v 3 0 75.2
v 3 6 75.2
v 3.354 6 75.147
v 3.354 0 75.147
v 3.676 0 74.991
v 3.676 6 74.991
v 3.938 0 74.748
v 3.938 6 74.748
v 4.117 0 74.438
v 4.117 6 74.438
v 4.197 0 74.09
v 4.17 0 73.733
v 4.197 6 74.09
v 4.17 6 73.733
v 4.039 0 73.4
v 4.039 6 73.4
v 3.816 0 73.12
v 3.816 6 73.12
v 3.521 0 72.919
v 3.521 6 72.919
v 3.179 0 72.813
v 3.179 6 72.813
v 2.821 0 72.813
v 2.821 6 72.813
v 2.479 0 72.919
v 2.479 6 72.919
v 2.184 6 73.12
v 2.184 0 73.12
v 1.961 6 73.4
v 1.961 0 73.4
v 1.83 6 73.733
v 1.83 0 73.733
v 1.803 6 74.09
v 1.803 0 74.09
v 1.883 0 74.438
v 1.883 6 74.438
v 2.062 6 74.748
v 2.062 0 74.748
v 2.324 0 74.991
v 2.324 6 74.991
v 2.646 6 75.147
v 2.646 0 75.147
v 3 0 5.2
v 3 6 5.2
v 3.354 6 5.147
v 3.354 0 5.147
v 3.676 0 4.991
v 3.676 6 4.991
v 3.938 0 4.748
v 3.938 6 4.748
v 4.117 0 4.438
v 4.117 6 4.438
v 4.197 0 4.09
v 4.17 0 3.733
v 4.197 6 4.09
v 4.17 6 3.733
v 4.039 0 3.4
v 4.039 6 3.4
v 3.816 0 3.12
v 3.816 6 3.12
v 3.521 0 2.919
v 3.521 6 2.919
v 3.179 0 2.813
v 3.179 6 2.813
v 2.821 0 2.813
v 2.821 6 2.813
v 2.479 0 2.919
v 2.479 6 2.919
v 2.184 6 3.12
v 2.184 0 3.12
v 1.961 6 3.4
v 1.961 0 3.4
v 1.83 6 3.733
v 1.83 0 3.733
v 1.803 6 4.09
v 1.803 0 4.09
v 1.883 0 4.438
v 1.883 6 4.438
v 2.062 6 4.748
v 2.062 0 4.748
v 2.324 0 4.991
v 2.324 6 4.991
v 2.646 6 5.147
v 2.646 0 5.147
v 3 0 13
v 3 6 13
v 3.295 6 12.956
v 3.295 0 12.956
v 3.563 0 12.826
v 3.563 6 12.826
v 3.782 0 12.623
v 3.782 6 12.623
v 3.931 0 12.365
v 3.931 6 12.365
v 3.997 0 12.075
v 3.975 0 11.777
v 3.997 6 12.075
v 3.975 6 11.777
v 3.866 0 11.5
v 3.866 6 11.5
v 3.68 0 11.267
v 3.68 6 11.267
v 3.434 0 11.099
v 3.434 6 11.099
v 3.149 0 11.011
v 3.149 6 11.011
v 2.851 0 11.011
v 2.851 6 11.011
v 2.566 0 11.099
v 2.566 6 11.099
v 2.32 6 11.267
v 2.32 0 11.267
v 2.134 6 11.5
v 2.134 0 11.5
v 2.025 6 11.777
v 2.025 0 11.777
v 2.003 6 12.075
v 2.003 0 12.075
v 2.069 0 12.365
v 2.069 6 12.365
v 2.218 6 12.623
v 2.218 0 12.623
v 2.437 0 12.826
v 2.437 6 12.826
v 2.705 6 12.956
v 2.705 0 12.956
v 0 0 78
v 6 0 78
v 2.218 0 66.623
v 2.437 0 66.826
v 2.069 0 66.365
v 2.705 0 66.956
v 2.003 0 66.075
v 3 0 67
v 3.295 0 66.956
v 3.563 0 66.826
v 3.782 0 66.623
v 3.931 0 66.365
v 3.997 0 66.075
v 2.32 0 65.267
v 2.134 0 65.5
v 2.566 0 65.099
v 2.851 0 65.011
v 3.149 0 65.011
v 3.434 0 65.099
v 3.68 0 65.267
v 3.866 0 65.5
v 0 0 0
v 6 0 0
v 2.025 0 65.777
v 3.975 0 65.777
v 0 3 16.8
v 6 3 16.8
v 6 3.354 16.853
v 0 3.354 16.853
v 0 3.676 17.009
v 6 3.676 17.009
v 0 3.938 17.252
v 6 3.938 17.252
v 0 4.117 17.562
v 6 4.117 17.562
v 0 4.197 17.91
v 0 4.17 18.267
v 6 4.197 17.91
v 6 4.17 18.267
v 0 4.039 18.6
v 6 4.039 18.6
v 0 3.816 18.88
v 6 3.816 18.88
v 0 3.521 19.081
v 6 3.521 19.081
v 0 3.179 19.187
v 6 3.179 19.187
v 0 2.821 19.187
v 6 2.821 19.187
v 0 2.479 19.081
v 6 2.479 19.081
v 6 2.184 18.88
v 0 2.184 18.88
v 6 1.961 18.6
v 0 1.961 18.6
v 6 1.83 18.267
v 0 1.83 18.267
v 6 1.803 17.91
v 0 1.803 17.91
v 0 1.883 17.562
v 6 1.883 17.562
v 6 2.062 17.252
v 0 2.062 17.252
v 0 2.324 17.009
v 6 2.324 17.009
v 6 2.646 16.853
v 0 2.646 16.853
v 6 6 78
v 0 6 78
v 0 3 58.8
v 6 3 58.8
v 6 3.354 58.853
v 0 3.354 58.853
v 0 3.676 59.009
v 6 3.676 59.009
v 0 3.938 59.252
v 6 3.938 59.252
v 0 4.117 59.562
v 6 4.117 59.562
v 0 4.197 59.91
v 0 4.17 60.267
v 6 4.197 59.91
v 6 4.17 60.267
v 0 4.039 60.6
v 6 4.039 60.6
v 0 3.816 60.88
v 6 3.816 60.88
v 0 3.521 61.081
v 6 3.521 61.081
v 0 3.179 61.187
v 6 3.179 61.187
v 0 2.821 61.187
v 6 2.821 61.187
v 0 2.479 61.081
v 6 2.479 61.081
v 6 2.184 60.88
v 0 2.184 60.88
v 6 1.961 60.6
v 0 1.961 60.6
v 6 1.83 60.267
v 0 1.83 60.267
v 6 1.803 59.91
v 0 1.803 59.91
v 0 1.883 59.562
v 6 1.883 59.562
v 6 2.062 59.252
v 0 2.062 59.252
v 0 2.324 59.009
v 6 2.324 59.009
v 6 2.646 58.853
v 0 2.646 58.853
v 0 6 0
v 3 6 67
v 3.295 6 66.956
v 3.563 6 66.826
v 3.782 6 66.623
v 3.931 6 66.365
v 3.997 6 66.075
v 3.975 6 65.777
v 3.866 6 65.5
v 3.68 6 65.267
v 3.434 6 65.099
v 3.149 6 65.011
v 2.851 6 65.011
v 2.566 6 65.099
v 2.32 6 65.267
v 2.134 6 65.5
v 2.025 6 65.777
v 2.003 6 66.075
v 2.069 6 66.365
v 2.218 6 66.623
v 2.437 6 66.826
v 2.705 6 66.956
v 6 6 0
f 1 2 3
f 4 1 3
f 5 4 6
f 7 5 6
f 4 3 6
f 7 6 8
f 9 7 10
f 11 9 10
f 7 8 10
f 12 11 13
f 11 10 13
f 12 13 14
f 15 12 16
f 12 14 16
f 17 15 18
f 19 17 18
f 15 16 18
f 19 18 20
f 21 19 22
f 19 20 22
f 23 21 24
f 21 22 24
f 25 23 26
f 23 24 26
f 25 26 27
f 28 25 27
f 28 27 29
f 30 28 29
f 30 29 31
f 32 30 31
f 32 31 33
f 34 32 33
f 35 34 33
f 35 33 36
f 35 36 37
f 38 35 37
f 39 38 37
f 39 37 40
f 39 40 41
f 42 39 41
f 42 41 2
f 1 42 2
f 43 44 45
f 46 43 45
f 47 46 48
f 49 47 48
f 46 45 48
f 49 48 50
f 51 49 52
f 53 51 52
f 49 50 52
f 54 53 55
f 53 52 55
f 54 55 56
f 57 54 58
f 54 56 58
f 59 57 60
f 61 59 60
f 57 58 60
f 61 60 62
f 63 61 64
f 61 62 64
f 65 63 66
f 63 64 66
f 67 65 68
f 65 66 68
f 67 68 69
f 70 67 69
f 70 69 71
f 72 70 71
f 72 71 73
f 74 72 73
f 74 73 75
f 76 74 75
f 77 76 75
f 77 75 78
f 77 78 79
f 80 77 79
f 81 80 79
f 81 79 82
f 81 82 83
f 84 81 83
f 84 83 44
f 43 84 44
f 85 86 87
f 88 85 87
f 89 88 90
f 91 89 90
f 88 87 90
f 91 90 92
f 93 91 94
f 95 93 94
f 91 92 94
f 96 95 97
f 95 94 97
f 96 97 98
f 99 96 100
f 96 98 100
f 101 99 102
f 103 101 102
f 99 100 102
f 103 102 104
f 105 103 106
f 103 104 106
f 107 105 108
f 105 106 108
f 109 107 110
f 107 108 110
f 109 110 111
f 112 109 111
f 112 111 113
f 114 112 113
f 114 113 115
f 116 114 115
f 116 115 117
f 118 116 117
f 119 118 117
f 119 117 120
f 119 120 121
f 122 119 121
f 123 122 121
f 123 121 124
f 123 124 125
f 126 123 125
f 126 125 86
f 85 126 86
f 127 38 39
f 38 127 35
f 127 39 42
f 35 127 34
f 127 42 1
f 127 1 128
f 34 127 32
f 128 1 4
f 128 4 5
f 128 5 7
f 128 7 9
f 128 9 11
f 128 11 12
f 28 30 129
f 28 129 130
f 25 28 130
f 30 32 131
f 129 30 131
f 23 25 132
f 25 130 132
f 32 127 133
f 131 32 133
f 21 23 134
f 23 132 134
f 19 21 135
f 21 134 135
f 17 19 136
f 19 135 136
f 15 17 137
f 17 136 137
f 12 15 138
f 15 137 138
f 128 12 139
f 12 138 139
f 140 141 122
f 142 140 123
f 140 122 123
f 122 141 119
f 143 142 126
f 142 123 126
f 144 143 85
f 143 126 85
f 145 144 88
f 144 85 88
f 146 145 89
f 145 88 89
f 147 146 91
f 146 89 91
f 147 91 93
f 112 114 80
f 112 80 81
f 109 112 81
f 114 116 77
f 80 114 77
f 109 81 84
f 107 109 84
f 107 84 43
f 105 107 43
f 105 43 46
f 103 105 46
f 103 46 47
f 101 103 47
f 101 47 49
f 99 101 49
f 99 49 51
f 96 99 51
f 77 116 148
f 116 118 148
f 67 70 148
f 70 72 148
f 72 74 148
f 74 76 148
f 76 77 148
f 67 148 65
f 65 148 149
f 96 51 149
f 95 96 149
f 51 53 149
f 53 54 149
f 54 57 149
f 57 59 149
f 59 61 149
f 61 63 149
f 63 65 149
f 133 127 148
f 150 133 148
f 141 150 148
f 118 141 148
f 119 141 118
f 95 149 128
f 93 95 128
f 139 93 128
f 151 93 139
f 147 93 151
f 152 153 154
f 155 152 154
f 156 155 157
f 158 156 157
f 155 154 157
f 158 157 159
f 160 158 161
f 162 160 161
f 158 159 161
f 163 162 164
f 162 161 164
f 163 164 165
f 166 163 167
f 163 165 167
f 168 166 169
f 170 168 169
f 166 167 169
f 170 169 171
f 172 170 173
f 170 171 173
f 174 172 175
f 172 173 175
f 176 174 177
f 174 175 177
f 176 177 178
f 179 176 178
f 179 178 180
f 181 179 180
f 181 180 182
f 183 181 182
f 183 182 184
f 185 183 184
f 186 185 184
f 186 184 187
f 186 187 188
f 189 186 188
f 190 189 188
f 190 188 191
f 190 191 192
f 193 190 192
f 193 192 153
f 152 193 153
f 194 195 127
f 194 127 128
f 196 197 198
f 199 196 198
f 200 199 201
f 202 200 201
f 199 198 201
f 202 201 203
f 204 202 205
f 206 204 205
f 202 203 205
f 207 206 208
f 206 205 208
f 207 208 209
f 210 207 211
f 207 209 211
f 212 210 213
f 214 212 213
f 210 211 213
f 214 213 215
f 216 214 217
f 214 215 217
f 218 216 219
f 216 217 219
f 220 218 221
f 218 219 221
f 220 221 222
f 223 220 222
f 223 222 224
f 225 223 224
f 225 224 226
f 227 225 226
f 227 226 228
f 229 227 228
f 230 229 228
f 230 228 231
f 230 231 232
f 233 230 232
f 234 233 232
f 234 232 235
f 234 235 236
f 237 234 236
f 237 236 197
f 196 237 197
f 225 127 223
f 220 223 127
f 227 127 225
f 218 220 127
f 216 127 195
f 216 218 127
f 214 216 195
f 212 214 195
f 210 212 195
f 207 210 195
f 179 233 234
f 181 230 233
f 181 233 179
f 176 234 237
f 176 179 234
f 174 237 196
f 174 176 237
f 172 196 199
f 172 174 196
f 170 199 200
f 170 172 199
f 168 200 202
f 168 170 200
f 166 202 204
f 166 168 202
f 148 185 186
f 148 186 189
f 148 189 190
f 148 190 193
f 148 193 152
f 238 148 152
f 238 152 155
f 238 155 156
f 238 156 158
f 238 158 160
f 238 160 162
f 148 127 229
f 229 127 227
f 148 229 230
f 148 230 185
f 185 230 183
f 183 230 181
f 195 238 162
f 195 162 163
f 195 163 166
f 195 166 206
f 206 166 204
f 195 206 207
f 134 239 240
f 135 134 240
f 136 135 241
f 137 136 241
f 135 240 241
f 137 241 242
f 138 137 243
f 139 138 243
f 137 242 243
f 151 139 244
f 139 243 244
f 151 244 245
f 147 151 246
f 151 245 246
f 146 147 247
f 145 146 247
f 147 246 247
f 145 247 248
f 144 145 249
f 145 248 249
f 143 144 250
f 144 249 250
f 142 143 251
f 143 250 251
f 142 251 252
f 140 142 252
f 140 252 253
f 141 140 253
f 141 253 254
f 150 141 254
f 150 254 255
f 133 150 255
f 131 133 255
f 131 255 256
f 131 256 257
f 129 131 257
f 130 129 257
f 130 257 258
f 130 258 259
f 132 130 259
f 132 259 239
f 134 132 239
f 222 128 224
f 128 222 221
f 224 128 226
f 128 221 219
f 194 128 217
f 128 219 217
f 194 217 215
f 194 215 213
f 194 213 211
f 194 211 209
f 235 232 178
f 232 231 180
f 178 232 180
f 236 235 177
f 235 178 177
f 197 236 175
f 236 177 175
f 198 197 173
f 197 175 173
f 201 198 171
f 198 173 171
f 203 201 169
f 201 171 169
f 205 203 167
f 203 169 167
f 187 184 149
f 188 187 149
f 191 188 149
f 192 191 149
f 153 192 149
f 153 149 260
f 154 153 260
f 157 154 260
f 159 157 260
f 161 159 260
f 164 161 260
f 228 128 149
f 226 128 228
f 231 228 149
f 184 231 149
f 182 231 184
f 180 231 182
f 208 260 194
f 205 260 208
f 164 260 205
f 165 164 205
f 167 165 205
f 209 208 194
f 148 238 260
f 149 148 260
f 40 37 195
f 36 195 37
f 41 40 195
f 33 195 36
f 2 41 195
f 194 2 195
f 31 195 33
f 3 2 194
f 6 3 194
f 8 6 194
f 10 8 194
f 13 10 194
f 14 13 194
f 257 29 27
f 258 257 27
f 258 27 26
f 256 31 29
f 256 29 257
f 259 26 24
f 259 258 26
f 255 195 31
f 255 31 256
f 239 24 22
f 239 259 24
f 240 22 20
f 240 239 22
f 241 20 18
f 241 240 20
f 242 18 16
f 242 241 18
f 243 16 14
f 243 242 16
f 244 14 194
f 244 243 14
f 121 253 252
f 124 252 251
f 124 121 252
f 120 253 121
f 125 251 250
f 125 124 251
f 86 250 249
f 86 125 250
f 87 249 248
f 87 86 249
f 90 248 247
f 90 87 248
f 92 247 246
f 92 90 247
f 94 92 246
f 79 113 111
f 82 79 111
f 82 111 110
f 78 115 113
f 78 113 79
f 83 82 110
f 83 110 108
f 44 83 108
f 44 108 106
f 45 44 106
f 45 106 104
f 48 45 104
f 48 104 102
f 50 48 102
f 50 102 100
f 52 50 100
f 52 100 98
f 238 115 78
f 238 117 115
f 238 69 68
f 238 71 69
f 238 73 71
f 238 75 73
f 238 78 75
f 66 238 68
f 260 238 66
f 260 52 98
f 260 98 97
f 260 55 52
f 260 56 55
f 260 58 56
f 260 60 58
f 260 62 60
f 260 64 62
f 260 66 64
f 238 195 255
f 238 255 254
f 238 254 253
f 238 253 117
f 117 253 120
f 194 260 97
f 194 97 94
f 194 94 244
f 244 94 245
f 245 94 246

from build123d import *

# Parameters (mm, degrees)
SKETCH_1_W          = 6
SKETCH_1_H          = 6
EXTRUDE_1_DEPTH     = 78
SKETCH_2_R          = 1.2
SKETCH_2_R_2        = 1
CUT_EXTRUDE_1_DEPTH = 80
SKETCH_3_R          = 1.2
CUT_EXTRUDE_2_DEPTH = 80


with BuildPart() as part:
    # 草图1 → 凸台-拉伸1 (new body)
    with BuildSketch(Plane.XY):
        with Locations((3, 3)):
            Rectangle(SKETCH_1_W, SKETCH_1_H)
    extrude(amount=EXTRUDE_1_DEPTH)

    # 草图2 → 切除-拉伸1 (cut)
    with BuildSketch(Plane(origin=(0, 6, 0), x_dir=(1, 0, 0), z_dir=(0, 1, 0))):
        with Locations(Location((3, -74, 0), (0, 0, 270))):
            Circle(SKETCH_2_R)
        with Locations(Location((3, -4, 0), (0, 0, 270))):
            Circle(SKETCH_2_R)
        with Locations(Location((3, -12, 0), (0, 0, 270))):
            Circle(SKETCH_2_R_2)
        with Locations(Location((3, -66, 0), (0, 0, 270))):
            Circle(SKETCH_2_R_2)
    extrude(amount=-CUT_EXTRUDE_1_DEPTH, mode=Mode.SUBTRACT)

    # 草图3 → 切除-拉伸2 (cut)
    with BuildSketch(Plane(origin=(6, 0, 0), x_dir=(0, 0, -1), z_dir=(1, 0, 0))):
        with Locations((-60, 3)):
            Circle(SKETCH_3_R)
        with Locations((-18, 3)):
            Circle(SKETCH_3_R)
    extrude(amount=-CUT_EXTRUDE_2_DEPTH, mode=Mode.SUBTRACT)


solid = part.part
